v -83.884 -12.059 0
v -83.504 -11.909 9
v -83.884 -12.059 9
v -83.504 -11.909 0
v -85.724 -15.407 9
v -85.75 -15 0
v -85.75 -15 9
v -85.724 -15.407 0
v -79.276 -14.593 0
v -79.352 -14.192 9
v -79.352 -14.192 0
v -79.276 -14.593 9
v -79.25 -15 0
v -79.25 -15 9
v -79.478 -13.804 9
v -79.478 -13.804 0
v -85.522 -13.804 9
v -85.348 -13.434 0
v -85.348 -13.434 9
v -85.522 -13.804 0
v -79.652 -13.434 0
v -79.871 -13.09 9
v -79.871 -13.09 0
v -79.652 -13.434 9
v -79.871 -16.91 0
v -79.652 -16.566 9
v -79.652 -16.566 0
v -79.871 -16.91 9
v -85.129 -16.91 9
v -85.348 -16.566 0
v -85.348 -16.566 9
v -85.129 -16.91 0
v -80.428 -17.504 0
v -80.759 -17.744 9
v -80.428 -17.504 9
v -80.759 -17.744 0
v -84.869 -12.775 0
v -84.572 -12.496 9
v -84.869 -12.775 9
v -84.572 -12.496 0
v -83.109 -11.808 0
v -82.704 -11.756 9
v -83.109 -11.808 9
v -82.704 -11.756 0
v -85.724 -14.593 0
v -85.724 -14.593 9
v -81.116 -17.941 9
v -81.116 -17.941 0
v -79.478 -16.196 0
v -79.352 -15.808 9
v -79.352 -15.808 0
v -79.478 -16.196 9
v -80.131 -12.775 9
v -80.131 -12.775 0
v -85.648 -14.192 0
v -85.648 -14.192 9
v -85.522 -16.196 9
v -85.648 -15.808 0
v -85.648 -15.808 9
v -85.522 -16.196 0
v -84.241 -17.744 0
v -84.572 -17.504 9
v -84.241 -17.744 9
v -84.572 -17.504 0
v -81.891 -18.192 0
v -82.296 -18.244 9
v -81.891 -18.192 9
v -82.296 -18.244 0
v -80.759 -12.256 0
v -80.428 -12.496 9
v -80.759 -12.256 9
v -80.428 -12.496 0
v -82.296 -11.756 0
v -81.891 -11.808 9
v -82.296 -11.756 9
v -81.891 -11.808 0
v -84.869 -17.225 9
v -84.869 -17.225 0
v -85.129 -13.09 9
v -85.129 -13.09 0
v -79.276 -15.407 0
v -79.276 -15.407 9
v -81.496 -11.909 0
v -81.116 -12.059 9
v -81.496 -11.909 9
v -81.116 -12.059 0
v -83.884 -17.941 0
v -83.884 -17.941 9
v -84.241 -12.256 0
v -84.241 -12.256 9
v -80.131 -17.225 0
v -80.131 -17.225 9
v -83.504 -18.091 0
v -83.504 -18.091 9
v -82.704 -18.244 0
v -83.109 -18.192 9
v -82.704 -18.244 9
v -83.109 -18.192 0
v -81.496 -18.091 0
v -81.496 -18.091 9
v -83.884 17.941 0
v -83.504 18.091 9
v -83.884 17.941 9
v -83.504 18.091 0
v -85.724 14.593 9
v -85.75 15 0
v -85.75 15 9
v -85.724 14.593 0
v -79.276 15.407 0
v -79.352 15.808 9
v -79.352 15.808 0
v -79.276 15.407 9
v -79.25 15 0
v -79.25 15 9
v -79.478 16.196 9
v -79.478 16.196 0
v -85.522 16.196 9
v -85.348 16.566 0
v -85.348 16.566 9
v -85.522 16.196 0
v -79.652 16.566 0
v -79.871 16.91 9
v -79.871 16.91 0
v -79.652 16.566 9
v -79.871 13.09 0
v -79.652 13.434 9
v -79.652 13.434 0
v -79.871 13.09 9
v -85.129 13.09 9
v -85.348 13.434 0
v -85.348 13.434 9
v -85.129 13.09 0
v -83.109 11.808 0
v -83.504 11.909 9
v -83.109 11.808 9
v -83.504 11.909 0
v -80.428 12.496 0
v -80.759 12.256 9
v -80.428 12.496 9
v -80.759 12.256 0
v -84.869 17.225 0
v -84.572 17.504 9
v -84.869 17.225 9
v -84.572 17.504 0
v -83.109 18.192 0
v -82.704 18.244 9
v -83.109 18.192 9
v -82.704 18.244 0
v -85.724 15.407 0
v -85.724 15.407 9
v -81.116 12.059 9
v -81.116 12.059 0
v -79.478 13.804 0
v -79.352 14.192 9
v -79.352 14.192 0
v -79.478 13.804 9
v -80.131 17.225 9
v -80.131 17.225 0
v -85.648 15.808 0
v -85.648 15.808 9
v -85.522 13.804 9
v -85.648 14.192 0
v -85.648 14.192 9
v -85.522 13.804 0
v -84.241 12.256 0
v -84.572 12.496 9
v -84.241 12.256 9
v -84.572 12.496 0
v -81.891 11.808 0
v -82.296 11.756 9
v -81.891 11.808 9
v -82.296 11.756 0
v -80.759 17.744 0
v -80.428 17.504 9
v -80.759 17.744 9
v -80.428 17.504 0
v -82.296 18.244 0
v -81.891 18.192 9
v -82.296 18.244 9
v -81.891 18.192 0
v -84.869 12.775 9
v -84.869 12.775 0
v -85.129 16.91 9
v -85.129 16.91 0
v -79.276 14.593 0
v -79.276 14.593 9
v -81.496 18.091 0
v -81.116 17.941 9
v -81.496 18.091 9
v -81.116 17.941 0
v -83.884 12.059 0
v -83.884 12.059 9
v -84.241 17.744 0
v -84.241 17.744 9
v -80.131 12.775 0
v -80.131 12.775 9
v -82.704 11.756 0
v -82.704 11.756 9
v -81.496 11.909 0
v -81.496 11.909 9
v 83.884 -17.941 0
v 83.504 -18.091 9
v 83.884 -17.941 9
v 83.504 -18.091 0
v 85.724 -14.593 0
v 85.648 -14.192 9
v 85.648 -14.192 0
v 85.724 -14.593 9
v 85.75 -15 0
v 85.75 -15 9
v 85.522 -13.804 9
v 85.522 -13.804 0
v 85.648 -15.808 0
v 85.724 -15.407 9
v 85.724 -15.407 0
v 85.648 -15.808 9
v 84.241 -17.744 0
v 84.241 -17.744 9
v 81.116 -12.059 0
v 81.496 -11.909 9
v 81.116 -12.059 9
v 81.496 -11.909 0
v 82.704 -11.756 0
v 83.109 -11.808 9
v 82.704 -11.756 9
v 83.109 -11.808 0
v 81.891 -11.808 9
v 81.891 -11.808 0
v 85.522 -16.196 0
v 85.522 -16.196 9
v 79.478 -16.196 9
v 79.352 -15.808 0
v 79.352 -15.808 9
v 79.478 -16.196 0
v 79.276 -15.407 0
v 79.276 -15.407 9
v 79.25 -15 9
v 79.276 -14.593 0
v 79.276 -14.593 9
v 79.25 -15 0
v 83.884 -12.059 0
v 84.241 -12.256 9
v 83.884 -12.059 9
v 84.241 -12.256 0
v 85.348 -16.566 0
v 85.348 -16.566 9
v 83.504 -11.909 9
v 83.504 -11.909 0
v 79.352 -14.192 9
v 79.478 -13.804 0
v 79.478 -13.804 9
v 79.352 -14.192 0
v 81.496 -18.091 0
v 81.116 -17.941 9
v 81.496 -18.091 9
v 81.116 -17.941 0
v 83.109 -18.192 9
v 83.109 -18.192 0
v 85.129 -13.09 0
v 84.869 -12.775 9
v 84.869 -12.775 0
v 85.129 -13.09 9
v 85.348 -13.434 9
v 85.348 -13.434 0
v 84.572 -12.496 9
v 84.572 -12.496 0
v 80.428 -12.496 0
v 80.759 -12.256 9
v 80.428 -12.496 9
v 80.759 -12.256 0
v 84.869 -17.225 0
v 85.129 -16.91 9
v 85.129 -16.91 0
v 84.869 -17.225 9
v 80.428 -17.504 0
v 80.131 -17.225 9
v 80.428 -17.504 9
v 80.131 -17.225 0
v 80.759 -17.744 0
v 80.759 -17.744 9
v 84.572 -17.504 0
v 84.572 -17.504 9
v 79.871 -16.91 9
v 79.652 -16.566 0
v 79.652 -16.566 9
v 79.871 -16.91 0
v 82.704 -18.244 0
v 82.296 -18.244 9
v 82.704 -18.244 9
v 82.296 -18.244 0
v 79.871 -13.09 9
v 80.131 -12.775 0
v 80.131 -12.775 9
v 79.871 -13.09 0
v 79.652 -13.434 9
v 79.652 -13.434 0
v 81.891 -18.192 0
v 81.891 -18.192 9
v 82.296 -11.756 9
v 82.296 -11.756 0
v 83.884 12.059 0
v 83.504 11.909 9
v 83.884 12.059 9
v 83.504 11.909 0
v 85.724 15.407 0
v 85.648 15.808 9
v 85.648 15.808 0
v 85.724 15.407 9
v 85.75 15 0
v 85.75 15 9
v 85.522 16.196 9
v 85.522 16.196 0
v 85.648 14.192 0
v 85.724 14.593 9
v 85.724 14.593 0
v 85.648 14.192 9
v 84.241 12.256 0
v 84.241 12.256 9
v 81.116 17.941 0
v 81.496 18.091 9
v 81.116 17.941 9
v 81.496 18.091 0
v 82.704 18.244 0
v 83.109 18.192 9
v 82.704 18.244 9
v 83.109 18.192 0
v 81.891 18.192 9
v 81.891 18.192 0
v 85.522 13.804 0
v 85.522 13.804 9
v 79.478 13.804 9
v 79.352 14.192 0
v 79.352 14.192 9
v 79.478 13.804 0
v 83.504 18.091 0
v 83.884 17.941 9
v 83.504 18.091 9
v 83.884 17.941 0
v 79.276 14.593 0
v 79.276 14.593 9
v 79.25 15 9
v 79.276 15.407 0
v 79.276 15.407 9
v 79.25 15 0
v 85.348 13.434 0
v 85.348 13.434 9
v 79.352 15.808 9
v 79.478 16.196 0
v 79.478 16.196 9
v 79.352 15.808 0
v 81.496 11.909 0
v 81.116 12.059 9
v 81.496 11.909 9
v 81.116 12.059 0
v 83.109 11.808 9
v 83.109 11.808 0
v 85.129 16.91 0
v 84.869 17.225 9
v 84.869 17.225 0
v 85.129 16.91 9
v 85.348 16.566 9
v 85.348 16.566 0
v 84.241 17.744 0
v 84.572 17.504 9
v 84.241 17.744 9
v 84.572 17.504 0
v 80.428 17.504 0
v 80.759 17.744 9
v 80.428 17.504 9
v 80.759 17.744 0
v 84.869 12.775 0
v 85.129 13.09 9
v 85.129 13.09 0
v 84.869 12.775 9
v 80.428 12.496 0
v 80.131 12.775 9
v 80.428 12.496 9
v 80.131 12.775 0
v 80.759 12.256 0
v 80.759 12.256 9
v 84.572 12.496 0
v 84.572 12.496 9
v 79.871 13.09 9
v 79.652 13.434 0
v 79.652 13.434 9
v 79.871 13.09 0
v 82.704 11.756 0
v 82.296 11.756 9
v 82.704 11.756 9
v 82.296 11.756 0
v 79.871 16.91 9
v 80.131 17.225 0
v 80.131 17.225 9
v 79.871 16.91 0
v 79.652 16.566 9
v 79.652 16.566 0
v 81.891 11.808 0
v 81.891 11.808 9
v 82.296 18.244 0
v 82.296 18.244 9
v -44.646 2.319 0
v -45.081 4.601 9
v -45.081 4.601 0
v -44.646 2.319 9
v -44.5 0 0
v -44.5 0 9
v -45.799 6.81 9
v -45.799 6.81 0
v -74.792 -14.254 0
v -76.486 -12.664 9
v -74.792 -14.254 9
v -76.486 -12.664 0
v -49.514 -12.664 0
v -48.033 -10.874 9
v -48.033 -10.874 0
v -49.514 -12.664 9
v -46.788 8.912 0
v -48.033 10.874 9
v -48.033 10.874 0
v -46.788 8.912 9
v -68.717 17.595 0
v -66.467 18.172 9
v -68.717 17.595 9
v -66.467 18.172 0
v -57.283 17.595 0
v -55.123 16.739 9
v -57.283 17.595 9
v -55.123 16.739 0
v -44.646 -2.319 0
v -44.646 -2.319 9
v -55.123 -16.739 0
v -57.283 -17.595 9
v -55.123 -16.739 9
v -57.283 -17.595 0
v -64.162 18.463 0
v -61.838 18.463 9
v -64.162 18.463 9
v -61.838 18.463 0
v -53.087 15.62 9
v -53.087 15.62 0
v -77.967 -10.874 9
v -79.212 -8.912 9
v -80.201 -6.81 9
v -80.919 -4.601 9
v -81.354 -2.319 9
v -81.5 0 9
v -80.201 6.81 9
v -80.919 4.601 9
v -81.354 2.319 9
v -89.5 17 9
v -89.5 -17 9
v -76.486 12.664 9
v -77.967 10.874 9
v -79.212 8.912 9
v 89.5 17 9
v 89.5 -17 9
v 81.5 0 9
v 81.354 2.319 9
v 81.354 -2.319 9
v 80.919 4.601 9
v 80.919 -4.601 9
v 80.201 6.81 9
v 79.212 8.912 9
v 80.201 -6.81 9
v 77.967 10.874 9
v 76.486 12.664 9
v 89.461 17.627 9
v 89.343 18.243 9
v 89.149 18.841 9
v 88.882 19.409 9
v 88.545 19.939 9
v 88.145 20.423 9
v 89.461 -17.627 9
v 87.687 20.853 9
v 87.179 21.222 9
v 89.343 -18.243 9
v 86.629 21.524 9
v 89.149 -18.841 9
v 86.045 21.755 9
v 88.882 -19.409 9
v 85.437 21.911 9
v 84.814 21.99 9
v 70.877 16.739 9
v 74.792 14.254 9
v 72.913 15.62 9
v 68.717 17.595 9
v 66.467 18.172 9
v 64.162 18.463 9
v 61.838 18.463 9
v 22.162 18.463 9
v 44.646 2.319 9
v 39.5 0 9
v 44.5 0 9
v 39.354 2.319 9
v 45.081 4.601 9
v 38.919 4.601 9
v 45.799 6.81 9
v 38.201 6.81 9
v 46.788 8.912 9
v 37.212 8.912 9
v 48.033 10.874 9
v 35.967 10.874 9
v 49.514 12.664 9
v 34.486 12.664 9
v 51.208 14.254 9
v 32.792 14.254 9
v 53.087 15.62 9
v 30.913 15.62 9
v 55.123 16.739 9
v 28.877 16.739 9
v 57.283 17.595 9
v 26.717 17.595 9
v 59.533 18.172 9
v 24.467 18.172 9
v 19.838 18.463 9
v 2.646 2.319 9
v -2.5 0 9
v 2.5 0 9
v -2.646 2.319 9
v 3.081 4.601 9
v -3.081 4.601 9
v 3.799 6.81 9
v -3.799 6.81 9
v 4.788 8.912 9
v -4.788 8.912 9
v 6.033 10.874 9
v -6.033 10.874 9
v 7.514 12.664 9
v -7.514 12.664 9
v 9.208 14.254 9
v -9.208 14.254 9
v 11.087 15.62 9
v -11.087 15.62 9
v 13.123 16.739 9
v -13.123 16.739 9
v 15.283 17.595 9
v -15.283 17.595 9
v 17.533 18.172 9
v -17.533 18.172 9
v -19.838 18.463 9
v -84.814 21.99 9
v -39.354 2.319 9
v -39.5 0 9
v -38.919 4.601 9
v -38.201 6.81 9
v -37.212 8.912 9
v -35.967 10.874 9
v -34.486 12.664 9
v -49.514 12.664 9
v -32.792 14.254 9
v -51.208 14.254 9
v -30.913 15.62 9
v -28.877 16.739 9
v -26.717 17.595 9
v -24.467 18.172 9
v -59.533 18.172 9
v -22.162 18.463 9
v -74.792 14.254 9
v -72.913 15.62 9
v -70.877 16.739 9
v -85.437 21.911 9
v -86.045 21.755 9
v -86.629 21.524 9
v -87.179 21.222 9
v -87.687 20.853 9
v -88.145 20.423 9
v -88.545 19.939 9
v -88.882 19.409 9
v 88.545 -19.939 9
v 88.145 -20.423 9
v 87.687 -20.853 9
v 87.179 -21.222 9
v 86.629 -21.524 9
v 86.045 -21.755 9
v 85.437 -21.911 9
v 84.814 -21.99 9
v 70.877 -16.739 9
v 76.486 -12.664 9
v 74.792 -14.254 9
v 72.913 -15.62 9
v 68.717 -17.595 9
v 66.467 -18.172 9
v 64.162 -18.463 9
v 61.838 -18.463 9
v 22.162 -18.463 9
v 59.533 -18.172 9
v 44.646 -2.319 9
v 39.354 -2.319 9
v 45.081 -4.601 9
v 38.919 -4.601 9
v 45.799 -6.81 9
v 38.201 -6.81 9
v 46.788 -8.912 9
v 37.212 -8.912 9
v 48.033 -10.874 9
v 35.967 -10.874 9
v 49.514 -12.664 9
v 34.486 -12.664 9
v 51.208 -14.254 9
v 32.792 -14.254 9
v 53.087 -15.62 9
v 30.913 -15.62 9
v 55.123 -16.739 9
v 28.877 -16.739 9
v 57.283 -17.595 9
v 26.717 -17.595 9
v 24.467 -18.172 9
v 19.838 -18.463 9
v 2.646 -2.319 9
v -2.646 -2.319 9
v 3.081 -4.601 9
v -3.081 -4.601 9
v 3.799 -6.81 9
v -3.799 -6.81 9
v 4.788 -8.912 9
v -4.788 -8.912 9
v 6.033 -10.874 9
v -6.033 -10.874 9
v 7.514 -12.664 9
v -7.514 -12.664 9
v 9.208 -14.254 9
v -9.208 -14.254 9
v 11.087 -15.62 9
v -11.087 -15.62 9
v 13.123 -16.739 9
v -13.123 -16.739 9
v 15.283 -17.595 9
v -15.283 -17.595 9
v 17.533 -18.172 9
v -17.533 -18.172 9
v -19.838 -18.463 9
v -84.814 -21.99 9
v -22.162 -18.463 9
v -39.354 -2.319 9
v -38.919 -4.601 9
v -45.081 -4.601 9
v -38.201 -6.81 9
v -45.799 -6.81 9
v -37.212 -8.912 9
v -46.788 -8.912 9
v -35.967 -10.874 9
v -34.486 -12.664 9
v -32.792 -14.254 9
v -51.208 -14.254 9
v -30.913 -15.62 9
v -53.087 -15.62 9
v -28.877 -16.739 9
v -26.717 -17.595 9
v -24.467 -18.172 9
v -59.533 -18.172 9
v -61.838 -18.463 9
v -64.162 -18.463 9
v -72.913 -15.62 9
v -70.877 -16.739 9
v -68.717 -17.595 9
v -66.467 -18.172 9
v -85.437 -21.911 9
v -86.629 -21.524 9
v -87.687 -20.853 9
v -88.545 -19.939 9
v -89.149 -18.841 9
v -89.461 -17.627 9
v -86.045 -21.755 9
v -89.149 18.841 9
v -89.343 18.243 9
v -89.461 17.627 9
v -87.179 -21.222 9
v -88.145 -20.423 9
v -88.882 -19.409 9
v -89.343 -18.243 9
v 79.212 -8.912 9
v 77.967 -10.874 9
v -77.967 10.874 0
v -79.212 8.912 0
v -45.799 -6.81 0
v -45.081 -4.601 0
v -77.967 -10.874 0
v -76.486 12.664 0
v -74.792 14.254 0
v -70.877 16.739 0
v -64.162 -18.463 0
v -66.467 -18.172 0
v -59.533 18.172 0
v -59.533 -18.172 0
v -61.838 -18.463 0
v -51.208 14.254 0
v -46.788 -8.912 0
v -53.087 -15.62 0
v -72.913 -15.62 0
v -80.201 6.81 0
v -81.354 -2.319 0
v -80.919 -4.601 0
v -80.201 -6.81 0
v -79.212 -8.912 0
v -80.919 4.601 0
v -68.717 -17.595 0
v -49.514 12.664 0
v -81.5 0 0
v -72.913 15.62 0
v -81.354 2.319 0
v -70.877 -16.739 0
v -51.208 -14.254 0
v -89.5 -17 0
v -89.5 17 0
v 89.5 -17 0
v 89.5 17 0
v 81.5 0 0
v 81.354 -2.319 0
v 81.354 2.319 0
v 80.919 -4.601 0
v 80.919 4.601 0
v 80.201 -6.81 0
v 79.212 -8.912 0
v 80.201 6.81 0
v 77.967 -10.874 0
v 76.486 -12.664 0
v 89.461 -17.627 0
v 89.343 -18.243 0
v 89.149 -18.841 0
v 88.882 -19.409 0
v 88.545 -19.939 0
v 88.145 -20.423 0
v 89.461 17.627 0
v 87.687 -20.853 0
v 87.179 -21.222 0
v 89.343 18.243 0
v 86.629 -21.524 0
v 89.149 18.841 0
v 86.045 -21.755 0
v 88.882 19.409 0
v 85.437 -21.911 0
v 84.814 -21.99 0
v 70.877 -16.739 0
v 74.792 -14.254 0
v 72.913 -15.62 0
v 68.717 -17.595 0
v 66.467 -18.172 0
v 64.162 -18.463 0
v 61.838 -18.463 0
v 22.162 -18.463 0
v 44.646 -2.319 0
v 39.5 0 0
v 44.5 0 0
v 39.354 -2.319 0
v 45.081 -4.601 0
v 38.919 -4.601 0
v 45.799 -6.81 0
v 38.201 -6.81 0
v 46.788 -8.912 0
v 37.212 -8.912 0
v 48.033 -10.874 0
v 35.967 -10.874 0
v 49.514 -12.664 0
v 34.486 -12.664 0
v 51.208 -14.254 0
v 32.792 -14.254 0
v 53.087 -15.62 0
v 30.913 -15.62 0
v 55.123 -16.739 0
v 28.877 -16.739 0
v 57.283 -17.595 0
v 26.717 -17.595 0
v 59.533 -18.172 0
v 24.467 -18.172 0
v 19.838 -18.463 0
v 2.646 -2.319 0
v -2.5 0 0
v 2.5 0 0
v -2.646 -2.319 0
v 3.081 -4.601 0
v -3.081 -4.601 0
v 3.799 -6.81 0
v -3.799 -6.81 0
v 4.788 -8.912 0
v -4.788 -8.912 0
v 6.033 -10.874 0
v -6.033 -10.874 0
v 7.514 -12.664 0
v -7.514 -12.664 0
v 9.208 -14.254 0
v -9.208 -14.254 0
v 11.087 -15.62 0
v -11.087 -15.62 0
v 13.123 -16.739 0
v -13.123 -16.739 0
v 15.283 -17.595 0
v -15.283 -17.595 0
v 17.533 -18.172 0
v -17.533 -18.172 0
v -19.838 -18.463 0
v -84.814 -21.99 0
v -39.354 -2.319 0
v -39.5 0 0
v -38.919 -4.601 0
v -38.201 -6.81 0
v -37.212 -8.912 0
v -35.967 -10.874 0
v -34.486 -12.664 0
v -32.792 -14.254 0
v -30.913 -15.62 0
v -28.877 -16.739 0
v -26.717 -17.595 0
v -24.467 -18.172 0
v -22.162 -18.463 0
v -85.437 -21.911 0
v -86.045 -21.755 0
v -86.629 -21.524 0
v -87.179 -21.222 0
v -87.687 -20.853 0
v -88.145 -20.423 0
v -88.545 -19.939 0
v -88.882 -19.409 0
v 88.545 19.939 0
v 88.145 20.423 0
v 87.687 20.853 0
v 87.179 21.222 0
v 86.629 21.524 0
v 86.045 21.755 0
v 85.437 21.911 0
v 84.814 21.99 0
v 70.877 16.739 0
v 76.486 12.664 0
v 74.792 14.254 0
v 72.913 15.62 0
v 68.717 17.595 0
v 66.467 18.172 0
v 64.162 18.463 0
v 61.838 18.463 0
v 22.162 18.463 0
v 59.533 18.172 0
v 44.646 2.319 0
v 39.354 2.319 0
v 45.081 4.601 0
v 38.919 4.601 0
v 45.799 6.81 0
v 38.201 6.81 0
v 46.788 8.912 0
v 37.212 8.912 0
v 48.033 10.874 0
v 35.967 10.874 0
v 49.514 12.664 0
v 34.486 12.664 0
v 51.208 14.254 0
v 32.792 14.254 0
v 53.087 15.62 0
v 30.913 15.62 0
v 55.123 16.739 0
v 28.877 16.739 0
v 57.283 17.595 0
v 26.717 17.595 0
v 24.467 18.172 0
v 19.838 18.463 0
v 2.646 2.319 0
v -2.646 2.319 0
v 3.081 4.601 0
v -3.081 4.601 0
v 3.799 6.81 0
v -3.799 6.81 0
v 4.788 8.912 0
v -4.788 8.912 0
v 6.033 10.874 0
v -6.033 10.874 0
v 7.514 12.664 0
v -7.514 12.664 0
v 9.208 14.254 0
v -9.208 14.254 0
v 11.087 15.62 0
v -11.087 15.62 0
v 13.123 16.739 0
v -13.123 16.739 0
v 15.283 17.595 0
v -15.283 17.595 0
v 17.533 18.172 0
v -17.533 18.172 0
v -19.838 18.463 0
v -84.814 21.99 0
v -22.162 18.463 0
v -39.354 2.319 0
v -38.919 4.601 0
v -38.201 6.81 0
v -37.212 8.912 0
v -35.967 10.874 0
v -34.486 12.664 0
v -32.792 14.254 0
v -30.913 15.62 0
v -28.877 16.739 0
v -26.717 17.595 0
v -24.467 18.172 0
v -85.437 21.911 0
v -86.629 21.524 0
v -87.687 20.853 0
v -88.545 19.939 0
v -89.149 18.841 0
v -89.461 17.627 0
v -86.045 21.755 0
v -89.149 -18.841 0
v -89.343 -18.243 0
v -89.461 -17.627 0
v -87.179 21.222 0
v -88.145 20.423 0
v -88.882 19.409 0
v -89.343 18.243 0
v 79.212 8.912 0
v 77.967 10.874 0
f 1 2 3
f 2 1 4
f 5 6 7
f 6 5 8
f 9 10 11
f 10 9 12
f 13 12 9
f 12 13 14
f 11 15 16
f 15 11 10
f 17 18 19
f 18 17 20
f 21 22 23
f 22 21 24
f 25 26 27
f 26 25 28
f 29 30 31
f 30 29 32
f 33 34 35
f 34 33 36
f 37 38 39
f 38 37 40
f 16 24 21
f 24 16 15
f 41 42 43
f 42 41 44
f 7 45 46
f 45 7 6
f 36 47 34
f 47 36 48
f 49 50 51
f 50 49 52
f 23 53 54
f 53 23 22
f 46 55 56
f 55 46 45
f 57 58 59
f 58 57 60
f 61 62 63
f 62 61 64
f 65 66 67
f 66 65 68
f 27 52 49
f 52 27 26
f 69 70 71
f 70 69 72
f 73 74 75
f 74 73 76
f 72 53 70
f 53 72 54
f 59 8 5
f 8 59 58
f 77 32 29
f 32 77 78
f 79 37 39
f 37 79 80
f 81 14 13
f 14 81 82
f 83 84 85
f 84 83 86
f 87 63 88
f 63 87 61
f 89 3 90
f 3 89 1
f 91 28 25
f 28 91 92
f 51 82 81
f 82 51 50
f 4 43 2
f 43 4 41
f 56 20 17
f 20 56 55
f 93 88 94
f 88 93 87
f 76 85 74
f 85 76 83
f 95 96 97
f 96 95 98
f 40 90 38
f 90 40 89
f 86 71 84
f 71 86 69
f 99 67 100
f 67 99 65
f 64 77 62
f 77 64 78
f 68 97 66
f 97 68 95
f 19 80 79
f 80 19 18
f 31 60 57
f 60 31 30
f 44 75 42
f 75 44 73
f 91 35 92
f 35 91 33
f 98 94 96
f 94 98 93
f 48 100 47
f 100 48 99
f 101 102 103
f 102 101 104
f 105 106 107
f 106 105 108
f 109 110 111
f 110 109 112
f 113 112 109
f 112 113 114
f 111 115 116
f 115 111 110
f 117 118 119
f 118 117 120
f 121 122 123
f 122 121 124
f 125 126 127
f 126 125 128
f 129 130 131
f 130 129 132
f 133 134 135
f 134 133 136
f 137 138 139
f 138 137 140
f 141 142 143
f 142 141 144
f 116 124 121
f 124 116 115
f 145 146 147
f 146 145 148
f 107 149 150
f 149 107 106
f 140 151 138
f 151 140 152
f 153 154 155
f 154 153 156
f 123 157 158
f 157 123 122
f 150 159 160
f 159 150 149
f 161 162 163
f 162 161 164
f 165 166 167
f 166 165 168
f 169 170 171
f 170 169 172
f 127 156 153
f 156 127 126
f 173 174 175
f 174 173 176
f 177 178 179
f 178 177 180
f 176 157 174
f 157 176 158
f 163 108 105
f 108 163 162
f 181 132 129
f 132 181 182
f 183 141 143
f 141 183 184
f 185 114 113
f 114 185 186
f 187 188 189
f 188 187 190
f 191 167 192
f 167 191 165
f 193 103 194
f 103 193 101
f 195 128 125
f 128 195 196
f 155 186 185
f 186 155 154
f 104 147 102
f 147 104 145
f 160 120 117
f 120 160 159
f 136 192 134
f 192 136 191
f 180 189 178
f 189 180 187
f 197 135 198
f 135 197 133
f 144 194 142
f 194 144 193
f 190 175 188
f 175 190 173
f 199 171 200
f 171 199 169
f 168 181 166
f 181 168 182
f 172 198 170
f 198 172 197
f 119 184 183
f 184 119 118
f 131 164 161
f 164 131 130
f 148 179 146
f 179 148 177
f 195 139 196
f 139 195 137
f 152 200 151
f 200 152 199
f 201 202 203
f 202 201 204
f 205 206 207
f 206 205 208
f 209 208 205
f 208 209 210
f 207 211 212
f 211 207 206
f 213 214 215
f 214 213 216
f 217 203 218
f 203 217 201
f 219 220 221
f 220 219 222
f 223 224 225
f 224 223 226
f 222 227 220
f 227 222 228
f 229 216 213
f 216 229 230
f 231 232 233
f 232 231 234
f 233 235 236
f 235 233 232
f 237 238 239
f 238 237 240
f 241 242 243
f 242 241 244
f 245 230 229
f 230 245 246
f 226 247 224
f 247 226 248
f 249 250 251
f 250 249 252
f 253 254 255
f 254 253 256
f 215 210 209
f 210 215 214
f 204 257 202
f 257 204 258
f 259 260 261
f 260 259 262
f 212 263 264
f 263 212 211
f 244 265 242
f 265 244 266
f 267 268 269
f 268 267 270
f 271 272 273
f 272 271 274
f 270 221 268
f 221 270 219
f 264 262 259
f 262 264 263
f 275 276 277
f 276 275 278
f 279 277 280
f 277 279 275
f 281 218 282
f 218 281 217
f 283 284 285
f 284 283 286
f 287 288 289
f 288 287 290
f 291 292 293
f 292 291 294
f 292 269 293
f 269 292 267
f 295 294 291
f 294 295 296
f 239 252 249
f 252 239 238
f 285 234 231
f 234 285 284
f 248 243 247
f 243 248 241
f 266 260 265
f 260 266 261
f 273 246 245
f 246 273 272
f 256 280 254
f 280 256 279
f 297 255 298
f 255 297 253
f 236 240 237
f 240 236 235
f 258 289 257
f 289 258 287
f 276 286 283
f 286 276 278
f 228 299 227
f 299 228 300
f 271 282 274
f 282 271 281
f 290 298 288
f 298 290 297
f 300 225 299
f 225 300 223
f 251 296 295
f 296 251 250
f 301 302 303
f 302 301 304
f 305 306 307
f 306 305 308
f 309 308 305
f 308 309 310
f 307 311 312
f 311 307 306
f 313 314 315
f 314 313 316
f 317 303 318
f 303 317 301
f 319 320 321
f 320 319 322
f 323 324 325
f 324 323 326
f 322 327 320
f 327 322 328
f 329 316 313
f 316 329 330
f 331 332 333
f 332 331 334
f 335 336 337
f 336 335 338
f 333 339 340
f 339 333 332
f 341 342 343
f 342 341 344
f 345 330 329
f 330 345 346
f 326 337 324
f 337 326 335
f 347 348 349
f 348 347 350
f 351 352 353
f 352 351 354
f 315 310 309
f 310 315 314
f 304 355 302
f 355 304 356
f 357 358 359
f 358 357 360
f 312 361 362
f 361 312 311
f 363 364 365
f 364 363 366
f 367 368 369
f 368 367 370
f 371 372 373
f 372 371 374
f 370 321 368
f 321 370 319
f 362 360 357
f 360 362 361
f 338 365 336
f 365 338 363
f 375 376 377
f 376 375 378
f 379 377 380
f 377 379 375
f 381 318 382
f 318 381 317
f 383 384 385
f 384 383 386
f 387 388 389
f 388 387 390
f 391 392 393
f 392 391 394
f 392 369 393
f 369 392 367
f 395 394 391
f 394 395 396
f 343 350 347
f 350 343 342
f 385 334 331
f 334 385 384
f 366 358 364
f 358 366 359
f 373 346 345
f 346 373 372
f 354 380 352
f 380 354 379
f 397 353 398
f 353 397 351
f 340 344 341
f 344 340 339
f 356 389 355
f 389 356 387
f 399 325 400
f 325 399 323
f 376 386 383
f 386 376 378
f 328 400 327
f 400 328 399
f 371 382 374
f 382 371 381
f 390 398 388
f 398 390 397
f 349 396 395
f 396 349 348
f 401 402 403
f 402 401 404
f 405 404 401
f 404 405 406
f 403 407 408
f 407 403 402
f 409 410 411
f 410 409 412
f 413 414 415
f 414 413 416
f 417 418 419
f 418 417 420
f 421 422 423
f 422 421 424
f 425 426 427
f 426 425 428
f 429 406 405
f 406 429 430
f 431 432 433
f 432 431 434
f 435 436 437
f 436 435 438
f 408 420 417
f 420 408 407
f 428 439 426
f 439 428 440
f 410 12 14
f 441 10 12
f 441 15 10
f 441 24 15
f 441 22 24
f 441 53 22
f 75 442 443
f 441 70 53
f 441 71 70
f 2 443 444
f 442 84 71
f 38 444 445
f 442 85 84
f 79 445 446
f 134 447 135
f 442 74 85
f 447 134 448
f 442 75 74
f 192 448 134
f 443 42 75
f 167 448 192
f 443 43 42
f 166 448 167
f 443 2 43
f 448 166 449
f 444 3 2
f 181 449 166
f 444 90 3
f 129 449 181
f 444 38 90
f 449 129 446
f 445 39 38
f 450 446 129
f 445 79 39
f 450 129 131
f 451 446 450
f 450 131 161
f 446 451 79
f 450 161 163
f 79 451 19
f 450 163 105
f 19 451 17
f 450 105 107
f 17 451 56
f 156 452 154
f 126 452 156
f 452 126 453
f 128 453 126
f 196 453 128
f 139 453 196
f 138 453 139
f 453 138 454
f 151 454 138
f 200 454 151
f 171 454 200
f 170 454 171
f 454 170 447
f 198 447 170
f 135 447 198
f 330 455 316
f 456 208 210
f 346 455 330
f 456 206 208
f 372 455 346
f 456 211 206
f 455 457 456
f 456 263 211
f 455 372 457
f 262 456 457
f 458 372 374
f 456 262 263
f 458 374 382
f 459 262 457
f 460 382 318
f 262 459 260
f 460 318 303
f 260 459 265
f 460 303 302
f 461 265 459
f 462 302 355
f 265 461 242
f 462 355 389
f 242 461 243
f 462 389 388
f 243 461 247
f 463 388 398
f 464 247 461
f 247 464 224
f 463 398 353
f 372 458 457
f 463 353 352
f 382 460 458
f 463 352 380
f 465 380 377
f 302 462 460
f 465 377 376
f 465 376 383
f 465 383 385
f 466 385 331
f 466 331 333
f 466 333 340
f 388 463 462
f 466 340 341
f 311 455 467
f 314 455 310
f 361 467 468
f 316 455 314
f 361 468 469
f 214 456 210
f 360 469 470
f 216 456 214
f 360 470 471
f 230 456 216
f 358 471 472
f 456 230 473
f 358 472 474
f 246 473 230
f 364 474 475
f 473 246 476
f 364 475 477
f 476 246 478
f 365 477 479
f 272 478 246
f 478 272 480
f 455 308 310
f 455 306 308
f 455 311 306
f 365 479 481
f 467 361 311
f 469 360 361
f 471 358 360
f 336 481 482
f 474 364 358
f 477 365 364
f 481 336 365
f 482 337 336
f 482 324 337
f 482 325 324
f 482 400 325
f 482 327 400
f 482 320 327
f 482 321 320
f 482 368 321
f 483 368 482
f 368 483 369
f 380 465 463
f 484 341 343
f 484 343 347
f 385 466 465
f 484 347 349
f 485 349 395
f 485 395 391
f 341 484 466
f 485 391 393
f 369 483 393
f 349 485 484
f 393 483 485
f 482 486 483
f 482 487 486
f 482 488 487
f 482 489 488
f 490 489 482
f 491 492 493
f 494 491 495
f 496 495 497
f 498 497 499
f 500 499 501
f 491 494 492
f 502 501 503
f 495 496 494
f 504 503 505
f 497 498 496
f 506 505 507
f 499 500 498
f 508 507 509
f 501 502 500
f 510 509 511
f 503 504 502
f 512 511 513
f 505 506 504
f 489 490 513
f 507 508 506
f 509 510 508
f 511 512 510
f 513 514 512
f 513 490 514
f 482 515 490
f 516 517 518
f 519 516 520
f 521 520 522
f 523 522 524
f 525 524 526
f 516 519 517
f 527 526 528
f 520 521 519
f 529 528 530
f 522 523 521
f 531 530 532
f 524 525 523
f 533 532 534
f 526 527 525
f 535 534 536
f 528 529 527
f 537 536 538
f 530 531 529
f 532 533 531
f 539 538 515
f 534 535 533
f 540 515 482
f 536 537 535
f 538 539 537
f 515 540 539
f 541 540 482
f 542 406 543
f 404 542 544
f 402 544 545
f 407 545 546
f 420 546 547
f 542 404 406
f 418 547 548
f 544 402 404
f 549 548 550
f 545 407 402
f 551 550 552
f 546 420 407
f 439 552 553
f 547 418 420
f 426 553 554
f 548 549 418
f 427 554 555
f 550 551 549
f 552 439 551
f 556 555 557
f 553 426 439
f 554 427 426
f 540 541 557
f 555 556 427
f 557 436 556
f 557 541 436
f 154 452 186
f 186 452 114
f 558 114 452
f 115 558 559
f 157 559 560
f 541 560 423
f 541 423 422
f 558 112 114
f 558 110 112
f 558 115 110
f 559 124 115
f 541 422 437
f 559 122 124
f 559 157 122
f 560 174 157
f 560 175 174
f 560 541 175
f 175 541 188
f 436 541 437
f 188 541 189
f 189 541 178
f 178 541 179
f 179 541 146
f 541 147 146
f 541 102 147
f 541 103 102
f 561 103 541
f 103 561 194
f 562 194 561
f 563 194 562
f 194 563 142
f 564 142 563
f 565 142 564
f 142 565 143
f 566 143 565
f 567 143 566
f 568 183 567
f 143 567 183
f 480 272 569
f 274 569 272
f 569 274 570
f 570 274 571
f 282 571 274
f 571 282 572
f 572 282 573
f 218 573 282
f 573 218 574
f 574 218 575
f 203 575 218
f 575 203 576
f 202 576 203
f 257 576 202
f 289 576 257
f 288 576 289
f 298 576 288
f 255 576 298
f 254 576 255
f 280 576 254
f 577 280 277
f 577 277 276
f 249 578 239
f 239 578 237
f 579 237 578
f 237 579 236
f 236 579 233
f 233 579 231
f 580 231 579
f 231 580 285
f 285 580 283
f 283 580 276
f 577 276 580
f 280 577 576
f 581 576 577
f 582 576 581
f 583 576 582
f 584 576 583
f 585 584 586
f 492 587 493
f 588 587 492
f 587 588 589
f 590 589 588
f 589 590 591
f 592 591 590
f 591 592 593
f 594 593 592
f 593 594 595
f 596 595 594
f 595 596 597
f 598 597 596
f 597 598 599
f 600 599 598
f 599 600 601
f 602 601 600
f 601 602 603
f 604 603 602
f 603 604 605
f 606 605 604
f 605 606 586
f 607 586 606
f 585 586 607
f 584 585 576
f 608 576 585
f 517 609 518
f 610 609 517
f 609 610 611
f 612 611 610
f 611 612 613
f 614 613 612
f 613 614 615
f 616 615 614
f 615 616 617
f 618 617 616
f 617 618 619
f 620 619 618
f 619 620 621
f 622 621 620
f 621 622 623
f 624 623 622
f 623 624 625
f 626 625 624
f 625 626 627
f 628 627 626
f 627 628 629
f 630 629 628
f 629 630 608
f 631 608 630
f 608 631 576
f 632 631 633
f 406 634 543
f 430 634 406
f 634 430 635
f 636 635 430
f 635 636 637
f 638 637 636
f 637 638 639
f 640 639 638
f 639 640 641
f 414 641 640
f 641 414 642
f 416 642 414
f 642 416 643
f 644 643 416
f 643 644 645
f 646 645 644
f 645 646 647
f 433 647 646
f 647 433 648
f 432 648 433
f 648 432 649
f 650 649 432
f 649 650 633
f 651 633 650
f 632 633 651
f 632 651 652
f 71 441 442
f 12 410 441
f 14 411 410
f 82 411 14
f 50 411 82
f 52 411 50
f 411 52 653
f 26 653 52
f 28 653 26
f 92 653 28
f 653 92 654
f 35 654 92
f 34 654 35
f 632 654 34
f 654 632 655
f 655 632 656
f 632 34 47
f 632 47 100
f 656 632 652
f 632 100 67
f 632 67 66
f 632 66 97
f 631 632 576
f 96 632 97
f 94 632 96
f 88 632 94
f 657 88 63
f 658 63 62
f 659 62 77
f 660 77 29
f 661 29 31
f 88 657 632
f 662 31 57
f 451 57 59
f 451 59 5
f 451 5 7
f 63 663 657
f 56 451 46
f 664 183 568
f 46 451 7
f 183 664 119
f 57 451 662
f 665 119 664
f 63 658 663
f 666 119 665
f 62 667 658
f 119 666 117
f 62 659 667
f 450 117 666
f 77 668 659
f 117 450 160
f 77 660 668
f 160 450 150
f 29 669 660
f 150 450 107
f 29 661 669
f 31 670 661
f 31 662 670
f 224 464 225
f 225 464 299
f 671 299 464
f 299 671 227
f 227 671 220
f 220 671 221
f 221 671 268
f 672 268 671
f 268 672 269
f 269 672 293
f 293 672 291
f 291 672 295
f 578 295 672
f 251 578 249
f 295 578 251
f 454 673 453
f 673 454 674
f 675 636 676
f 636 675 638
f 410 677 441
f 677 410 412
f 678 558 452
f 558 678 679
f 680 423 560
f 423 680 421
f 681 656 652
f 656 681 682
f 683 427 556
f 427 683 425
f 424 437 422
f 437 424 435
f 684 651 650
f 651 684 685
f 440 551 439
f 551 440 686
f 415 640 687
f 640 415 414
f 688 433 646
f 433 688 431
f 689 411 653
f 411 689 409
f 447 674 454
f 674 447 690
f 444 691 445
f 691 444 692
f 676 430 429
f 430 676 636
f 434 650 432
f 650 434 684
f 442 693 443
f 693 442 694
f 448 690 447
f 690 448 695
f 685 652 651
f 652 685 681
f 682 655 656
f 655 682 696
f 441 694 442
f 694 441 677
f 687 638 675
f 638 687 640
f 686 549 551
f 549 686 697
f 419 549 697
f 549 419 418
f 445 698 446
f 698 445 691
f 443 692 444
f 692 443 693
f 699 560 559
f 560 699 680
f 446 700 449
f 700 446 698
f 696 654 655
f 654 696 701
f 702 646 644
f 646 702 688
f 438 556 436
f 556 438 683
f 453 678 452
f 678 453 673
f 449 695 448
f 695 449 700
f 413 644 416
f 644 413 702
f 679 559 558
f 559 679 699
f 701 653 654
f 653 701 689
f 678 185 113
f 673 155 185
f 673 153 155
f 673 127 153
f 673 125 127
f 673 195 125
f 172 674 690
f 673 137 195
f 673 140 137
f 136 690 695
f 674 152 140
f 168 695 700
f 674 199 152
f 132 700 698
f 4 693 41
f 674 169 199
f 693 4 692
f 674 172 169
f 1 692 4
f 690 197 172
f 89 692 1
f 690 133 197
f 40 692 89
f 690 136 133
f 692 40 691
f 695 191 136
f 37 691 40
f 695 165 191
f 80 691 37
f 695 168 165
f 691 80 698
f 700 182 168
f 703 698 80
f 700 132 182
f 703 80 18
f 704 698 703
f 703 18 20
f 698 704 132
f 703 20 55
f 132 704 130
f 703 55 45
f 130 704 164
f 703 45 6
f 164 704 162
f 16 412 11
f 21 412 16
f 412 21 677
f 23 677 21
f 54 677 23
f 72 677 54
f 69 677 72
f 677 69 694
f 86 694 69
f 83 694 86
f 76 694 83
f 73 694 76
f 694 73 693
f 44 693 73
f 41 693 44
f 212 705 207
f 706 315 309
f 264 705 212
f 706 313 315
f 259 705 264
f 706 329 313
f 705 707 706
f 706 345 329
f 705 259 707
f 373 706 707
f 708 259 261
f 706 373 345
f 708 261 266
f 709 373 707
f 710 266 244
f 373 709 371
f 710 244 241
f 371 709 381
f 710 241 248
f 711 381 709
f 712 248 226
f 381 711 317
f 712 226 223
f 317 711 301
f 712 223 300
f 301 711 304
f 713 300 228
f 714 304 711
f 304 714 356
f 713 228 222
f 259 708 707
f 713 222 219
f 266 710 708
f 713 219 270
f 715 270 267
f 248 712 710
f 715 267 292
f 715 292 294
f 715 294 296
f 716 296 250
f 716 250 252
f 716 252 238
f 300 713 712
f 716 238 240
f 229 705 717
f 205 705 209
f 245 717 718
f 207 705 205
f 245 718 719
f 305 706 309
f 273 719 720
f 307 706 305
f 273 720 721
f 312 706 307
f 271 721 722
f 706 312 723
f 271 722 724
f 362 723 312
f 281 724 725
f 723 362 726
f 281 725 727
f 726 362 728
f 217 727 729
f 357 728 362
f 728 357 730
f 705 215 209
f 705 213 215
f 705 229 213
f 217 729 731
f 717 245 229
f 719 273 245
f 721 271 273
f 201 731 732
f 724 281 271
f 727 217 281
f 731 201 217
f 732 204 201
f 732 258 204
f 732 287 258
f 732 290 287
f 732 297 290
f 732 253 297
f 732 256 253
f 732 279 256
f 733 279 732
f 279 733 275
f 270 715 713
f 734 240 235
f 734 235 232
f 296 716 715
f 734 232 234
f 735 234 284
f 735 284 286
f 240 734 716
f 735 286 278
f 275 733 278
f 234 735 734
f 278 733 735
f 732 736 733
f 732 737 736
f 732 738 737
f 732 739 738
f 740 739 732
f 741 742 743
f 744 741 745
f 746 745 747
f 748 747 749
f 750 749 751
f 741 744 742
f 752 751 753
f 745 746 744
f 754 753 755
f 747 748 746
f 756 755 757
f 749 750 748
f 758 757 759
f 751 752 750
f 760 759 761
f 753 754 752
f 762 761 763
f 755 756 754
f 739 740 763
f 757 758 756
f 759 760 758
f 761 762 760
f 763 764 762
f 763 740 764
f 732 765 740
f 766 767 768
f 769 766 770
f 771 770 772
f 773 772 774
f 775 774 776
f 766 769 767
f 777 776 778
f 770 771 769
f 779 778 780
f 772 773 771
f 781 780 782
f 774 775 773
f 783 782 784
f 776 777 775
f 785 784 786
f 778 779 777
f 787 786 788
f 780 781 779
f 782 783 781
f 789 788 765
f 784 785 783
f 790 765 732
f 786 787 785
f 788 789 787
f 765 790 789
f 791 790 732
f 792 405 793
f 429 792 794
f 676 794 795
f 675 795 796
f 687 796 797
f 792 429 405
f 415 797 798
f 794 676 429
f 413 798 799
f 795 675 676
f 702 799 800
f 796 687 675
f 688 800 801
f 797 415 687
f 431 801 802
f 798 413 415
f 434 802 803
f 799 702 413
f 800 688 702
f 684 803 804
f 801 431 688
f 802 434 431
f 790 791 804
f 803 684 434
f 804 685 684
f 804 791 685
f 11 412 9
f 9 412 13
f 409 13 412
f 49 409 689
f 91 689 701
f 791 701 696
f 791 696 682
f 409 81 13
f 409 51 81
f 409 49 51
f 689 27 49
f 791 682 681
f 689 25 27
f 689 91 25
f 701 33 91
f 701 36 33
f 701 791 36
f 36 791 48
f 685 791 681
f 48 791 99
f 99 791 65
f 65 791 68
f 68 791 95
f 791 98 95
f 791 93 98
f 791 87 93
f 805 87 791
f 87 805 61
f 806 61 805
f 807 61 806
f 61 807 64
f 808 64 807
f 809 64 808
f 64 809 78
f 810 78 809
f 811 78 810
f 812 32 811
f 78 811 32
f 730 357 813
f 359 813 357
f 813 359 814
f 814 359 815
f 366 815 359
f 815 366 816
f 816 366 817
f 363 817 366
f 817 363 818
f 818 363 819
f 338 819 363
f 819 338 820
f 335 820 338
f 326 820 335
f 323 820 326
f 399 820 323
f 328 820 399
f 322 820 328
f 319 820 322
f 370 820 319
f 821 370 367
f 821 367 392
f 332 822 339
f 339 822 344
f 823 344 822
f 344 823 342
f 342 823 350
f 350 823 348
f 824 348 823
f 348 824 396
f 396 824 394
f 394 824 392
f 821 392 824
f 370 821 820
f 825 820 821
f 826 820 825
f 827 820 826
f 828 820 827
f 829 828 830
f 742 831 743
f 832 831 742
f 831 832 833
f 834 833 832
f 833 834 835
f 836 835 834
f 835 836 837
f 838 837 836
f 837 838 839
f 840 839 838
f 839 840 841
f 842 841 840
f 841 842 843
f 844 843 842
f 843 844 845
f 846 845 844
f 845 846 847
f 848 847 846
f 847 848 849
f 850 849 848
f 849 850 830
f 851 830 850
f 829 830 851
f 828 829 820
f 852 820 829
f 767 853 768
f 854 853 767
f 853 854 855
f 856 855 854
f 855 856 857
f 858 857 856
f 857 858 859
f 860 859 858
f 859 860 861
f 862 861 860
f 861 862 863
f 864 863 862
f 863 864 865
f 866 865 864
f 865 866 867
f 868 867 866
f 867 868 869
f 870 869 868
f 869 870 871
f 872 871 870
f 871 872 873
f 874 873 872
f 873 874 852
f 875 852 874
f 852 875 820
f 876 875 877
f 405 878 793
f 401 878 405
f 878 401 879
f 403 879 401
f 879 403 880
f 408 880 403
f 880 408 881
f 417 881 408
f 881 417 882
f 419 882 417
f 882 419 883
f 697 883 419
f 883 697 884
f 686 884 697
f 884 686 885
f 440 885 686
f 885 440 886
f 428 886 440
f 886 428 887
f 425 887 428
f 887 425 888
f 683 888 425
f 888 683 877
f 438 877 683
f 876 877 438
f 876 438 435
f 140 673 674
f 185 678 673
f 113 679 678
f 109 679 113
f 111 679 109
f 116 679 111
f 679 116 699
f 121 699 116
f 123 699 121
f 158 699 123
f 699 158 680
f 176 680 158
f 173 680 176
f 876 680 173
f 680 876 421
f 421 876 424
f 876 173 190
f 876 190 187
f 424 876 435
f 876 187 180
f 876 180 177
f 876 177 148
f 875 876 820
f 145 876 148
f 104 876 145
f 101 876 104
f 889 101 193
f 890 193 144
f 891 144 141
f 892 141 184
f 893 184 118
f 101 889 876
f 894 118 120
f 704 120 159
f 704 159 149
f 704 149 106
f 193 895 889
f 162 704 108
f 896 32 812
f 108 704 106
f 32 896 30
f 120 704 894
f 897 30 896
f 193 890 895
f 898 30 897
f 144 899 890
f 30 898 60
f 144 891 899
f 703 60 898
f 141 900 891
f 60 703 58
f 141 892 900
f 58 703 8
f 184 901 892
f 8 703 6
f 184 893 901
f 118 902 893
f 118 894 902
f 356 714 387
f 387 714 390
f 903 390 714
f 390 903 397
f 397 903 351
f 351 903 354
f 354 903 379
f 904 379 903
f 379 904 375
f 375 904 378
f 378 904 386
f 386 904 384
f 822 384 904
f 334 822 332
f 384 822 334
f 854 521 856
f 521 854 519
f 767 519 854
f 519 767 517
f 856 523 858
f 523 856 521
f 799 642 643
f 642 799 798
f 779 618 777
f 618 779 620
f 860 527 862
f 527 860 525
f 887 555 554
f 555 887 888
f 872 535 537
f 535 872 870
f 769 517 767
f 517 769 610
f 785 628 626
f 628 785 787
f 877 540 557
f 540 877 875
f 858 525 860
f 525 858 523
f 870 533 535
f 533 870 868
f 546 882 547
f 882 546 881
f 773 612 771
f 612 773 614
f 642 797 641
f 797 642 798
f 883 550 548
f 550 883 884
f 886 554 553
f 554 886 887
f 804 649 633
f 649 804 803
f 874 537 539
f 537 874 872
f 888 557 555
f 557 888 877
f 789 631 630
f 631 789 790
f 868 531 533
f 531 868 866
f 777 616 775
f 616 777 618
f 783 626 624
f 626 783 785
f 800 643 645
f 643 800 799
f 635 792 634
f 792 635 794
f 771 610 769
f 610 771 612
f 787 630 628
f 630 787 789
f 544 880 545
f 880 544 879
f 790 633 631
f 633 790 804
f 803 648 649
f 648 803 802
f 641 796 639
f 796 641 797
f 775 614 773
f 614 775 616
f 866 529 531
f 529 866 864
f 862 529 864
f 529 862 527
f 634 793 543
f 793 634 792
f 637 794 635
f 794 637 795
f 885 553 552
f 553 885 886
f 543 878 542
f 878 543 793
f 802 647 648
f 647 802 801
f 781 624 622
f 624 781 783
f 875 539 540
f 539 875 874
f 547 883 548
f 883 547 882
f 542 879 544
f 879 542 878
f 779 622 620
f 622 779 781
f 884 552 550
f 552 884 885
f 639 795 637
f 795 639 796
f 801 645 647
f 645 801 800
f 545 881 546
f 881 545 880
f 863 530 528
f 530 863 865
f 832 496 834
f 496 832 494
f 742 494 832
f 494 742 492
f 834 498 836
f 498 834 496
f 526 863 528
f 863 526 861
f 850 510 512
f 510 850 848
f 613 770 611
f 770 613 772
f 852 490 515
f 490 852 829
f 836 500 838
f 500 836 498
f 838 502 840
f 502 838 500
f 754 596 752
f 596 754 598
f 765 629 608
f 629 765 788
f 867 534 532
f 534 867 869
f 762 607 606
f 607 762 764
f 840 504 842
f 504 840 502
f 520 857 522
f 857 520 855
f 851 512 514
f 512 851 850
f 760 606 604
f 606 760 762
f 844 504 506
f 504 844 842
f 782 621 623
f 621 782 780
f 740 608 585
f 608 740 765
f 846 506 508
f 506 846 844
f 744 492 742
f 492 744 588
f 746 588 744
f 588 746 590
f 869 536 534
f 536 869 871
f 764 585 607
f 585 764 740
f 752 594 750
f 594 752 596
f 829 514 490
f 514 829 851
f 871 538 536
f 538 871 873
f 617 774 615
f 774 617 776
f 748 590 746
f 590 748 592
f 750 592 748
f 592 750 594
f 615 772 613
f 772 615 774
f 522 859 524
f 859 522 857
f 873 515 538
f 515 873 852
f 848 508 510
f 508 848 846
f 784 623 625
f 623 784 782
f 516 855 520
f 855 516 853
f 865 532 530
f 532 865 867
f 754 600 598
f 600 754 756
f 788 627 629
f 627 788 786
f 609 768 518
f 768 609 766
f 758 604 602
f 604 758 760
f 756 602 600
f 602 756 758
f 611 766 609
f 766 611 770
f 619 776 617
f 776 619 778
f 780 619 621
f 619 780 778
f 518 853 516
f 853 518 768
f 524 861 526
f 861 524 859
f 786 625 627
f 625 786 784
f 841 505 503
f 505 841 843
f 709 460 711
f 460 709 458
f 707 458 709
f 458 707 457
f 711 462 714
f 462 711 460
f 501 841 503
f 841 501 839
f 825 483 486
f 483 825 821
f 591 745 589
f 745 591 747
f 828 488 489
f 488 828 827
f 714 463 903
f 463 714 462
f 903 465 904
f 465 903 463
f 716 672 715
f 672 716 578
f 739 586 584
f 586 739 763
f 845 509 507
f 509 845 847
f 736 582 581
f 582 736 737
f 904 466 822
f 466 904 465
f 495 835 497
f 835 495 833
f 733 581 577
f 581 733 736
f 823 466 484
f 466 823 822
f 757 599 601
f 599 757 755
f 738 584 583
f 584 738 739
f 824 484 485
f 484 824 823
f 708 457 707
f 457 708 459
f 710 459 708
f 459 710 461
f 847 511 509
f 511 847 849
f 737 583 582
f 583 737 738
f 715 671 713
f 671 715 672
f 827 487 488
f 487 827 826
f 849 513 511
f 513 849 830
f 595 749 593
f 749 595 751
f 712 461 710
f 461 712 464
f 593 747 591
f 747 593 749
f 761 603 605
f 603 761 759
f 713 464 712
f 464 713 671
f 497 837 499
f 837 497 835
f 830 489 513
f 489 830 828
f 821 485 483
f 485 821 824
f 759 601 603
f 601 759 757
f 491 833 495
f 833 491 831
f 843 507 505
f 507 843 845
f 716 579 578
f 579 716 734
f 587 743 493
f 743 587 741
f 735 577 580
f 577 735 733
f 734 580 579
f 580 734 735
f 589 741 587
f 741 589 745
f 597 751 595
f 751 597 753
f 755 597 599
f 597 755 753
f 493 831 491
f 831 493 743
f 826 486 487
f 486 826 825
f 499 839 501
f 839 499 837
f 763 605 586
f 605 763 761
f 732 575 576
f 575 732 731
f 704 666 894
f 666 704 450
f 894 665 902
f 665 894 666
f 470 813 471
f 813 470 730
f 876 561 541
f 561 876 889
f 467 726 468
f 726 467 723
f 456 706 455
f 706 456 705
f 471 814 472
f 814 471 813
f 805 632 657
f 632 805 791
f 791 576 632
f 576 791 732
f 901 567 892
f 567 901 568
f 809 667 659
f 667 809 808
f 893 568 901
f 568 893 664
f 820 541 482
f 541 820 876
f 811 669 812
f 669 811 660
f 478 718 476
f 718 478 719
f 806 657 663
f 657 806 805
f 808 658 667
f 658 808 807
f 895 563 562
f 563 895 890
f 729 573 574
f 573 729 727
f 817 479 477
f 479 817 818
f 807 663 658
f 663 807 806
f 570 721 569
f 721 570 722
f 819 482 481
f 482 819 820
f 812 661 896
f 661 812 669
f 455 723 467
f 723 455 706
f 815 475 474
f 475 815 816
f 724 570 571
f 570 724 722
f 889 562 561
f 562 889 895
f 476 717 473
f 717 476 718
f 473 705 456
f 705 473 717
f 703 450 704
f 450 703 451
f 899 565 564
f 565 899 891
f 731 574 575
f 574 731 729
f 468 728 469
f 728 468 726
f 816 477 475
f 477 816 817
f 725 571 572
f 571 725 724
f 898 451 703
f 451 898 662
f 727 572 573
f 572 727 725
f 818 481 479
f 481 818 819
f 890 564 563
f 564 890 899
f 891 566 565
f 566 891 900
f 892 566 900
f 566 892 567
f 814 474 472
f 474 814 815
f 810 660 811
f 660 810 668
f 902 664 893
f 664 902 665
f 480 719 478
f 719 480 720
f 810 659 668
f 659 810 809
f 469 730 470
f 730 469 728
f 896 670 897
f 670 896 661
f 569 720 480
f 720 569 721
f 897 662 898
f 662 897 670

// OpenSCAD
$fn = 50;


difference() {
	union() {
		hull() {
			translate(v = [-84.5000000000, 17.0000000000, 0]) {
				cylinder(h = 9, r = 5);
			}
			translate(v = [84.5000000000, 17.0000000000, 0]) {
				cylinder(h = 9, r = 5);
			}
			translate(v = [-84.5000000000, -17.0000000000, 0]) {
				cylinder(h = 9, r = 5);
			}
			translate(v = [84.5000000000, -17.0000000000, 0]) {
				cylinder(h = 9, r = 5);
			}
		}
	}
	union() {
		#translate(v = [-82.5000000000, -15.0000000000, -100.0000000000]) {
			cylinder(h = 200, r = 3.2500000000);
		}
		#translate(v = [-82.5000000000, 15.0000000000, -100.0000000000]) {
			cylinder(h = 200, r = 3.2500000000);
		}
		#translate(v = [82.5000000000, -15.0000000000, -100.0000000000]) {
			cylinder(h = 200, r = 3.2500000000);
		}
		#translate(v = [82.5000000000, 15.0000000000, -100.0000000000]) {
			cylinder(h = 200, r = 3.2500000000);
		}
		#translate(v = [-63.0000000000, 0, 0]) {
			cylinder(h = 9, r = 18.5000000000);
		}
		#translate(v = [-21.0000000000, 0, 0]) {
			cylinder(h = 9, r = 18.5000000000);
		}
		#translate(v = [21.0000000000, 0, 0]) {
			cylinder(h = 9, r = 18.5000000000);
		}
		#translate(v = [63.0000000000, 0, 0]) {
			cylinder(h = 9, r = 18.5000000000);
		}
	}
}
